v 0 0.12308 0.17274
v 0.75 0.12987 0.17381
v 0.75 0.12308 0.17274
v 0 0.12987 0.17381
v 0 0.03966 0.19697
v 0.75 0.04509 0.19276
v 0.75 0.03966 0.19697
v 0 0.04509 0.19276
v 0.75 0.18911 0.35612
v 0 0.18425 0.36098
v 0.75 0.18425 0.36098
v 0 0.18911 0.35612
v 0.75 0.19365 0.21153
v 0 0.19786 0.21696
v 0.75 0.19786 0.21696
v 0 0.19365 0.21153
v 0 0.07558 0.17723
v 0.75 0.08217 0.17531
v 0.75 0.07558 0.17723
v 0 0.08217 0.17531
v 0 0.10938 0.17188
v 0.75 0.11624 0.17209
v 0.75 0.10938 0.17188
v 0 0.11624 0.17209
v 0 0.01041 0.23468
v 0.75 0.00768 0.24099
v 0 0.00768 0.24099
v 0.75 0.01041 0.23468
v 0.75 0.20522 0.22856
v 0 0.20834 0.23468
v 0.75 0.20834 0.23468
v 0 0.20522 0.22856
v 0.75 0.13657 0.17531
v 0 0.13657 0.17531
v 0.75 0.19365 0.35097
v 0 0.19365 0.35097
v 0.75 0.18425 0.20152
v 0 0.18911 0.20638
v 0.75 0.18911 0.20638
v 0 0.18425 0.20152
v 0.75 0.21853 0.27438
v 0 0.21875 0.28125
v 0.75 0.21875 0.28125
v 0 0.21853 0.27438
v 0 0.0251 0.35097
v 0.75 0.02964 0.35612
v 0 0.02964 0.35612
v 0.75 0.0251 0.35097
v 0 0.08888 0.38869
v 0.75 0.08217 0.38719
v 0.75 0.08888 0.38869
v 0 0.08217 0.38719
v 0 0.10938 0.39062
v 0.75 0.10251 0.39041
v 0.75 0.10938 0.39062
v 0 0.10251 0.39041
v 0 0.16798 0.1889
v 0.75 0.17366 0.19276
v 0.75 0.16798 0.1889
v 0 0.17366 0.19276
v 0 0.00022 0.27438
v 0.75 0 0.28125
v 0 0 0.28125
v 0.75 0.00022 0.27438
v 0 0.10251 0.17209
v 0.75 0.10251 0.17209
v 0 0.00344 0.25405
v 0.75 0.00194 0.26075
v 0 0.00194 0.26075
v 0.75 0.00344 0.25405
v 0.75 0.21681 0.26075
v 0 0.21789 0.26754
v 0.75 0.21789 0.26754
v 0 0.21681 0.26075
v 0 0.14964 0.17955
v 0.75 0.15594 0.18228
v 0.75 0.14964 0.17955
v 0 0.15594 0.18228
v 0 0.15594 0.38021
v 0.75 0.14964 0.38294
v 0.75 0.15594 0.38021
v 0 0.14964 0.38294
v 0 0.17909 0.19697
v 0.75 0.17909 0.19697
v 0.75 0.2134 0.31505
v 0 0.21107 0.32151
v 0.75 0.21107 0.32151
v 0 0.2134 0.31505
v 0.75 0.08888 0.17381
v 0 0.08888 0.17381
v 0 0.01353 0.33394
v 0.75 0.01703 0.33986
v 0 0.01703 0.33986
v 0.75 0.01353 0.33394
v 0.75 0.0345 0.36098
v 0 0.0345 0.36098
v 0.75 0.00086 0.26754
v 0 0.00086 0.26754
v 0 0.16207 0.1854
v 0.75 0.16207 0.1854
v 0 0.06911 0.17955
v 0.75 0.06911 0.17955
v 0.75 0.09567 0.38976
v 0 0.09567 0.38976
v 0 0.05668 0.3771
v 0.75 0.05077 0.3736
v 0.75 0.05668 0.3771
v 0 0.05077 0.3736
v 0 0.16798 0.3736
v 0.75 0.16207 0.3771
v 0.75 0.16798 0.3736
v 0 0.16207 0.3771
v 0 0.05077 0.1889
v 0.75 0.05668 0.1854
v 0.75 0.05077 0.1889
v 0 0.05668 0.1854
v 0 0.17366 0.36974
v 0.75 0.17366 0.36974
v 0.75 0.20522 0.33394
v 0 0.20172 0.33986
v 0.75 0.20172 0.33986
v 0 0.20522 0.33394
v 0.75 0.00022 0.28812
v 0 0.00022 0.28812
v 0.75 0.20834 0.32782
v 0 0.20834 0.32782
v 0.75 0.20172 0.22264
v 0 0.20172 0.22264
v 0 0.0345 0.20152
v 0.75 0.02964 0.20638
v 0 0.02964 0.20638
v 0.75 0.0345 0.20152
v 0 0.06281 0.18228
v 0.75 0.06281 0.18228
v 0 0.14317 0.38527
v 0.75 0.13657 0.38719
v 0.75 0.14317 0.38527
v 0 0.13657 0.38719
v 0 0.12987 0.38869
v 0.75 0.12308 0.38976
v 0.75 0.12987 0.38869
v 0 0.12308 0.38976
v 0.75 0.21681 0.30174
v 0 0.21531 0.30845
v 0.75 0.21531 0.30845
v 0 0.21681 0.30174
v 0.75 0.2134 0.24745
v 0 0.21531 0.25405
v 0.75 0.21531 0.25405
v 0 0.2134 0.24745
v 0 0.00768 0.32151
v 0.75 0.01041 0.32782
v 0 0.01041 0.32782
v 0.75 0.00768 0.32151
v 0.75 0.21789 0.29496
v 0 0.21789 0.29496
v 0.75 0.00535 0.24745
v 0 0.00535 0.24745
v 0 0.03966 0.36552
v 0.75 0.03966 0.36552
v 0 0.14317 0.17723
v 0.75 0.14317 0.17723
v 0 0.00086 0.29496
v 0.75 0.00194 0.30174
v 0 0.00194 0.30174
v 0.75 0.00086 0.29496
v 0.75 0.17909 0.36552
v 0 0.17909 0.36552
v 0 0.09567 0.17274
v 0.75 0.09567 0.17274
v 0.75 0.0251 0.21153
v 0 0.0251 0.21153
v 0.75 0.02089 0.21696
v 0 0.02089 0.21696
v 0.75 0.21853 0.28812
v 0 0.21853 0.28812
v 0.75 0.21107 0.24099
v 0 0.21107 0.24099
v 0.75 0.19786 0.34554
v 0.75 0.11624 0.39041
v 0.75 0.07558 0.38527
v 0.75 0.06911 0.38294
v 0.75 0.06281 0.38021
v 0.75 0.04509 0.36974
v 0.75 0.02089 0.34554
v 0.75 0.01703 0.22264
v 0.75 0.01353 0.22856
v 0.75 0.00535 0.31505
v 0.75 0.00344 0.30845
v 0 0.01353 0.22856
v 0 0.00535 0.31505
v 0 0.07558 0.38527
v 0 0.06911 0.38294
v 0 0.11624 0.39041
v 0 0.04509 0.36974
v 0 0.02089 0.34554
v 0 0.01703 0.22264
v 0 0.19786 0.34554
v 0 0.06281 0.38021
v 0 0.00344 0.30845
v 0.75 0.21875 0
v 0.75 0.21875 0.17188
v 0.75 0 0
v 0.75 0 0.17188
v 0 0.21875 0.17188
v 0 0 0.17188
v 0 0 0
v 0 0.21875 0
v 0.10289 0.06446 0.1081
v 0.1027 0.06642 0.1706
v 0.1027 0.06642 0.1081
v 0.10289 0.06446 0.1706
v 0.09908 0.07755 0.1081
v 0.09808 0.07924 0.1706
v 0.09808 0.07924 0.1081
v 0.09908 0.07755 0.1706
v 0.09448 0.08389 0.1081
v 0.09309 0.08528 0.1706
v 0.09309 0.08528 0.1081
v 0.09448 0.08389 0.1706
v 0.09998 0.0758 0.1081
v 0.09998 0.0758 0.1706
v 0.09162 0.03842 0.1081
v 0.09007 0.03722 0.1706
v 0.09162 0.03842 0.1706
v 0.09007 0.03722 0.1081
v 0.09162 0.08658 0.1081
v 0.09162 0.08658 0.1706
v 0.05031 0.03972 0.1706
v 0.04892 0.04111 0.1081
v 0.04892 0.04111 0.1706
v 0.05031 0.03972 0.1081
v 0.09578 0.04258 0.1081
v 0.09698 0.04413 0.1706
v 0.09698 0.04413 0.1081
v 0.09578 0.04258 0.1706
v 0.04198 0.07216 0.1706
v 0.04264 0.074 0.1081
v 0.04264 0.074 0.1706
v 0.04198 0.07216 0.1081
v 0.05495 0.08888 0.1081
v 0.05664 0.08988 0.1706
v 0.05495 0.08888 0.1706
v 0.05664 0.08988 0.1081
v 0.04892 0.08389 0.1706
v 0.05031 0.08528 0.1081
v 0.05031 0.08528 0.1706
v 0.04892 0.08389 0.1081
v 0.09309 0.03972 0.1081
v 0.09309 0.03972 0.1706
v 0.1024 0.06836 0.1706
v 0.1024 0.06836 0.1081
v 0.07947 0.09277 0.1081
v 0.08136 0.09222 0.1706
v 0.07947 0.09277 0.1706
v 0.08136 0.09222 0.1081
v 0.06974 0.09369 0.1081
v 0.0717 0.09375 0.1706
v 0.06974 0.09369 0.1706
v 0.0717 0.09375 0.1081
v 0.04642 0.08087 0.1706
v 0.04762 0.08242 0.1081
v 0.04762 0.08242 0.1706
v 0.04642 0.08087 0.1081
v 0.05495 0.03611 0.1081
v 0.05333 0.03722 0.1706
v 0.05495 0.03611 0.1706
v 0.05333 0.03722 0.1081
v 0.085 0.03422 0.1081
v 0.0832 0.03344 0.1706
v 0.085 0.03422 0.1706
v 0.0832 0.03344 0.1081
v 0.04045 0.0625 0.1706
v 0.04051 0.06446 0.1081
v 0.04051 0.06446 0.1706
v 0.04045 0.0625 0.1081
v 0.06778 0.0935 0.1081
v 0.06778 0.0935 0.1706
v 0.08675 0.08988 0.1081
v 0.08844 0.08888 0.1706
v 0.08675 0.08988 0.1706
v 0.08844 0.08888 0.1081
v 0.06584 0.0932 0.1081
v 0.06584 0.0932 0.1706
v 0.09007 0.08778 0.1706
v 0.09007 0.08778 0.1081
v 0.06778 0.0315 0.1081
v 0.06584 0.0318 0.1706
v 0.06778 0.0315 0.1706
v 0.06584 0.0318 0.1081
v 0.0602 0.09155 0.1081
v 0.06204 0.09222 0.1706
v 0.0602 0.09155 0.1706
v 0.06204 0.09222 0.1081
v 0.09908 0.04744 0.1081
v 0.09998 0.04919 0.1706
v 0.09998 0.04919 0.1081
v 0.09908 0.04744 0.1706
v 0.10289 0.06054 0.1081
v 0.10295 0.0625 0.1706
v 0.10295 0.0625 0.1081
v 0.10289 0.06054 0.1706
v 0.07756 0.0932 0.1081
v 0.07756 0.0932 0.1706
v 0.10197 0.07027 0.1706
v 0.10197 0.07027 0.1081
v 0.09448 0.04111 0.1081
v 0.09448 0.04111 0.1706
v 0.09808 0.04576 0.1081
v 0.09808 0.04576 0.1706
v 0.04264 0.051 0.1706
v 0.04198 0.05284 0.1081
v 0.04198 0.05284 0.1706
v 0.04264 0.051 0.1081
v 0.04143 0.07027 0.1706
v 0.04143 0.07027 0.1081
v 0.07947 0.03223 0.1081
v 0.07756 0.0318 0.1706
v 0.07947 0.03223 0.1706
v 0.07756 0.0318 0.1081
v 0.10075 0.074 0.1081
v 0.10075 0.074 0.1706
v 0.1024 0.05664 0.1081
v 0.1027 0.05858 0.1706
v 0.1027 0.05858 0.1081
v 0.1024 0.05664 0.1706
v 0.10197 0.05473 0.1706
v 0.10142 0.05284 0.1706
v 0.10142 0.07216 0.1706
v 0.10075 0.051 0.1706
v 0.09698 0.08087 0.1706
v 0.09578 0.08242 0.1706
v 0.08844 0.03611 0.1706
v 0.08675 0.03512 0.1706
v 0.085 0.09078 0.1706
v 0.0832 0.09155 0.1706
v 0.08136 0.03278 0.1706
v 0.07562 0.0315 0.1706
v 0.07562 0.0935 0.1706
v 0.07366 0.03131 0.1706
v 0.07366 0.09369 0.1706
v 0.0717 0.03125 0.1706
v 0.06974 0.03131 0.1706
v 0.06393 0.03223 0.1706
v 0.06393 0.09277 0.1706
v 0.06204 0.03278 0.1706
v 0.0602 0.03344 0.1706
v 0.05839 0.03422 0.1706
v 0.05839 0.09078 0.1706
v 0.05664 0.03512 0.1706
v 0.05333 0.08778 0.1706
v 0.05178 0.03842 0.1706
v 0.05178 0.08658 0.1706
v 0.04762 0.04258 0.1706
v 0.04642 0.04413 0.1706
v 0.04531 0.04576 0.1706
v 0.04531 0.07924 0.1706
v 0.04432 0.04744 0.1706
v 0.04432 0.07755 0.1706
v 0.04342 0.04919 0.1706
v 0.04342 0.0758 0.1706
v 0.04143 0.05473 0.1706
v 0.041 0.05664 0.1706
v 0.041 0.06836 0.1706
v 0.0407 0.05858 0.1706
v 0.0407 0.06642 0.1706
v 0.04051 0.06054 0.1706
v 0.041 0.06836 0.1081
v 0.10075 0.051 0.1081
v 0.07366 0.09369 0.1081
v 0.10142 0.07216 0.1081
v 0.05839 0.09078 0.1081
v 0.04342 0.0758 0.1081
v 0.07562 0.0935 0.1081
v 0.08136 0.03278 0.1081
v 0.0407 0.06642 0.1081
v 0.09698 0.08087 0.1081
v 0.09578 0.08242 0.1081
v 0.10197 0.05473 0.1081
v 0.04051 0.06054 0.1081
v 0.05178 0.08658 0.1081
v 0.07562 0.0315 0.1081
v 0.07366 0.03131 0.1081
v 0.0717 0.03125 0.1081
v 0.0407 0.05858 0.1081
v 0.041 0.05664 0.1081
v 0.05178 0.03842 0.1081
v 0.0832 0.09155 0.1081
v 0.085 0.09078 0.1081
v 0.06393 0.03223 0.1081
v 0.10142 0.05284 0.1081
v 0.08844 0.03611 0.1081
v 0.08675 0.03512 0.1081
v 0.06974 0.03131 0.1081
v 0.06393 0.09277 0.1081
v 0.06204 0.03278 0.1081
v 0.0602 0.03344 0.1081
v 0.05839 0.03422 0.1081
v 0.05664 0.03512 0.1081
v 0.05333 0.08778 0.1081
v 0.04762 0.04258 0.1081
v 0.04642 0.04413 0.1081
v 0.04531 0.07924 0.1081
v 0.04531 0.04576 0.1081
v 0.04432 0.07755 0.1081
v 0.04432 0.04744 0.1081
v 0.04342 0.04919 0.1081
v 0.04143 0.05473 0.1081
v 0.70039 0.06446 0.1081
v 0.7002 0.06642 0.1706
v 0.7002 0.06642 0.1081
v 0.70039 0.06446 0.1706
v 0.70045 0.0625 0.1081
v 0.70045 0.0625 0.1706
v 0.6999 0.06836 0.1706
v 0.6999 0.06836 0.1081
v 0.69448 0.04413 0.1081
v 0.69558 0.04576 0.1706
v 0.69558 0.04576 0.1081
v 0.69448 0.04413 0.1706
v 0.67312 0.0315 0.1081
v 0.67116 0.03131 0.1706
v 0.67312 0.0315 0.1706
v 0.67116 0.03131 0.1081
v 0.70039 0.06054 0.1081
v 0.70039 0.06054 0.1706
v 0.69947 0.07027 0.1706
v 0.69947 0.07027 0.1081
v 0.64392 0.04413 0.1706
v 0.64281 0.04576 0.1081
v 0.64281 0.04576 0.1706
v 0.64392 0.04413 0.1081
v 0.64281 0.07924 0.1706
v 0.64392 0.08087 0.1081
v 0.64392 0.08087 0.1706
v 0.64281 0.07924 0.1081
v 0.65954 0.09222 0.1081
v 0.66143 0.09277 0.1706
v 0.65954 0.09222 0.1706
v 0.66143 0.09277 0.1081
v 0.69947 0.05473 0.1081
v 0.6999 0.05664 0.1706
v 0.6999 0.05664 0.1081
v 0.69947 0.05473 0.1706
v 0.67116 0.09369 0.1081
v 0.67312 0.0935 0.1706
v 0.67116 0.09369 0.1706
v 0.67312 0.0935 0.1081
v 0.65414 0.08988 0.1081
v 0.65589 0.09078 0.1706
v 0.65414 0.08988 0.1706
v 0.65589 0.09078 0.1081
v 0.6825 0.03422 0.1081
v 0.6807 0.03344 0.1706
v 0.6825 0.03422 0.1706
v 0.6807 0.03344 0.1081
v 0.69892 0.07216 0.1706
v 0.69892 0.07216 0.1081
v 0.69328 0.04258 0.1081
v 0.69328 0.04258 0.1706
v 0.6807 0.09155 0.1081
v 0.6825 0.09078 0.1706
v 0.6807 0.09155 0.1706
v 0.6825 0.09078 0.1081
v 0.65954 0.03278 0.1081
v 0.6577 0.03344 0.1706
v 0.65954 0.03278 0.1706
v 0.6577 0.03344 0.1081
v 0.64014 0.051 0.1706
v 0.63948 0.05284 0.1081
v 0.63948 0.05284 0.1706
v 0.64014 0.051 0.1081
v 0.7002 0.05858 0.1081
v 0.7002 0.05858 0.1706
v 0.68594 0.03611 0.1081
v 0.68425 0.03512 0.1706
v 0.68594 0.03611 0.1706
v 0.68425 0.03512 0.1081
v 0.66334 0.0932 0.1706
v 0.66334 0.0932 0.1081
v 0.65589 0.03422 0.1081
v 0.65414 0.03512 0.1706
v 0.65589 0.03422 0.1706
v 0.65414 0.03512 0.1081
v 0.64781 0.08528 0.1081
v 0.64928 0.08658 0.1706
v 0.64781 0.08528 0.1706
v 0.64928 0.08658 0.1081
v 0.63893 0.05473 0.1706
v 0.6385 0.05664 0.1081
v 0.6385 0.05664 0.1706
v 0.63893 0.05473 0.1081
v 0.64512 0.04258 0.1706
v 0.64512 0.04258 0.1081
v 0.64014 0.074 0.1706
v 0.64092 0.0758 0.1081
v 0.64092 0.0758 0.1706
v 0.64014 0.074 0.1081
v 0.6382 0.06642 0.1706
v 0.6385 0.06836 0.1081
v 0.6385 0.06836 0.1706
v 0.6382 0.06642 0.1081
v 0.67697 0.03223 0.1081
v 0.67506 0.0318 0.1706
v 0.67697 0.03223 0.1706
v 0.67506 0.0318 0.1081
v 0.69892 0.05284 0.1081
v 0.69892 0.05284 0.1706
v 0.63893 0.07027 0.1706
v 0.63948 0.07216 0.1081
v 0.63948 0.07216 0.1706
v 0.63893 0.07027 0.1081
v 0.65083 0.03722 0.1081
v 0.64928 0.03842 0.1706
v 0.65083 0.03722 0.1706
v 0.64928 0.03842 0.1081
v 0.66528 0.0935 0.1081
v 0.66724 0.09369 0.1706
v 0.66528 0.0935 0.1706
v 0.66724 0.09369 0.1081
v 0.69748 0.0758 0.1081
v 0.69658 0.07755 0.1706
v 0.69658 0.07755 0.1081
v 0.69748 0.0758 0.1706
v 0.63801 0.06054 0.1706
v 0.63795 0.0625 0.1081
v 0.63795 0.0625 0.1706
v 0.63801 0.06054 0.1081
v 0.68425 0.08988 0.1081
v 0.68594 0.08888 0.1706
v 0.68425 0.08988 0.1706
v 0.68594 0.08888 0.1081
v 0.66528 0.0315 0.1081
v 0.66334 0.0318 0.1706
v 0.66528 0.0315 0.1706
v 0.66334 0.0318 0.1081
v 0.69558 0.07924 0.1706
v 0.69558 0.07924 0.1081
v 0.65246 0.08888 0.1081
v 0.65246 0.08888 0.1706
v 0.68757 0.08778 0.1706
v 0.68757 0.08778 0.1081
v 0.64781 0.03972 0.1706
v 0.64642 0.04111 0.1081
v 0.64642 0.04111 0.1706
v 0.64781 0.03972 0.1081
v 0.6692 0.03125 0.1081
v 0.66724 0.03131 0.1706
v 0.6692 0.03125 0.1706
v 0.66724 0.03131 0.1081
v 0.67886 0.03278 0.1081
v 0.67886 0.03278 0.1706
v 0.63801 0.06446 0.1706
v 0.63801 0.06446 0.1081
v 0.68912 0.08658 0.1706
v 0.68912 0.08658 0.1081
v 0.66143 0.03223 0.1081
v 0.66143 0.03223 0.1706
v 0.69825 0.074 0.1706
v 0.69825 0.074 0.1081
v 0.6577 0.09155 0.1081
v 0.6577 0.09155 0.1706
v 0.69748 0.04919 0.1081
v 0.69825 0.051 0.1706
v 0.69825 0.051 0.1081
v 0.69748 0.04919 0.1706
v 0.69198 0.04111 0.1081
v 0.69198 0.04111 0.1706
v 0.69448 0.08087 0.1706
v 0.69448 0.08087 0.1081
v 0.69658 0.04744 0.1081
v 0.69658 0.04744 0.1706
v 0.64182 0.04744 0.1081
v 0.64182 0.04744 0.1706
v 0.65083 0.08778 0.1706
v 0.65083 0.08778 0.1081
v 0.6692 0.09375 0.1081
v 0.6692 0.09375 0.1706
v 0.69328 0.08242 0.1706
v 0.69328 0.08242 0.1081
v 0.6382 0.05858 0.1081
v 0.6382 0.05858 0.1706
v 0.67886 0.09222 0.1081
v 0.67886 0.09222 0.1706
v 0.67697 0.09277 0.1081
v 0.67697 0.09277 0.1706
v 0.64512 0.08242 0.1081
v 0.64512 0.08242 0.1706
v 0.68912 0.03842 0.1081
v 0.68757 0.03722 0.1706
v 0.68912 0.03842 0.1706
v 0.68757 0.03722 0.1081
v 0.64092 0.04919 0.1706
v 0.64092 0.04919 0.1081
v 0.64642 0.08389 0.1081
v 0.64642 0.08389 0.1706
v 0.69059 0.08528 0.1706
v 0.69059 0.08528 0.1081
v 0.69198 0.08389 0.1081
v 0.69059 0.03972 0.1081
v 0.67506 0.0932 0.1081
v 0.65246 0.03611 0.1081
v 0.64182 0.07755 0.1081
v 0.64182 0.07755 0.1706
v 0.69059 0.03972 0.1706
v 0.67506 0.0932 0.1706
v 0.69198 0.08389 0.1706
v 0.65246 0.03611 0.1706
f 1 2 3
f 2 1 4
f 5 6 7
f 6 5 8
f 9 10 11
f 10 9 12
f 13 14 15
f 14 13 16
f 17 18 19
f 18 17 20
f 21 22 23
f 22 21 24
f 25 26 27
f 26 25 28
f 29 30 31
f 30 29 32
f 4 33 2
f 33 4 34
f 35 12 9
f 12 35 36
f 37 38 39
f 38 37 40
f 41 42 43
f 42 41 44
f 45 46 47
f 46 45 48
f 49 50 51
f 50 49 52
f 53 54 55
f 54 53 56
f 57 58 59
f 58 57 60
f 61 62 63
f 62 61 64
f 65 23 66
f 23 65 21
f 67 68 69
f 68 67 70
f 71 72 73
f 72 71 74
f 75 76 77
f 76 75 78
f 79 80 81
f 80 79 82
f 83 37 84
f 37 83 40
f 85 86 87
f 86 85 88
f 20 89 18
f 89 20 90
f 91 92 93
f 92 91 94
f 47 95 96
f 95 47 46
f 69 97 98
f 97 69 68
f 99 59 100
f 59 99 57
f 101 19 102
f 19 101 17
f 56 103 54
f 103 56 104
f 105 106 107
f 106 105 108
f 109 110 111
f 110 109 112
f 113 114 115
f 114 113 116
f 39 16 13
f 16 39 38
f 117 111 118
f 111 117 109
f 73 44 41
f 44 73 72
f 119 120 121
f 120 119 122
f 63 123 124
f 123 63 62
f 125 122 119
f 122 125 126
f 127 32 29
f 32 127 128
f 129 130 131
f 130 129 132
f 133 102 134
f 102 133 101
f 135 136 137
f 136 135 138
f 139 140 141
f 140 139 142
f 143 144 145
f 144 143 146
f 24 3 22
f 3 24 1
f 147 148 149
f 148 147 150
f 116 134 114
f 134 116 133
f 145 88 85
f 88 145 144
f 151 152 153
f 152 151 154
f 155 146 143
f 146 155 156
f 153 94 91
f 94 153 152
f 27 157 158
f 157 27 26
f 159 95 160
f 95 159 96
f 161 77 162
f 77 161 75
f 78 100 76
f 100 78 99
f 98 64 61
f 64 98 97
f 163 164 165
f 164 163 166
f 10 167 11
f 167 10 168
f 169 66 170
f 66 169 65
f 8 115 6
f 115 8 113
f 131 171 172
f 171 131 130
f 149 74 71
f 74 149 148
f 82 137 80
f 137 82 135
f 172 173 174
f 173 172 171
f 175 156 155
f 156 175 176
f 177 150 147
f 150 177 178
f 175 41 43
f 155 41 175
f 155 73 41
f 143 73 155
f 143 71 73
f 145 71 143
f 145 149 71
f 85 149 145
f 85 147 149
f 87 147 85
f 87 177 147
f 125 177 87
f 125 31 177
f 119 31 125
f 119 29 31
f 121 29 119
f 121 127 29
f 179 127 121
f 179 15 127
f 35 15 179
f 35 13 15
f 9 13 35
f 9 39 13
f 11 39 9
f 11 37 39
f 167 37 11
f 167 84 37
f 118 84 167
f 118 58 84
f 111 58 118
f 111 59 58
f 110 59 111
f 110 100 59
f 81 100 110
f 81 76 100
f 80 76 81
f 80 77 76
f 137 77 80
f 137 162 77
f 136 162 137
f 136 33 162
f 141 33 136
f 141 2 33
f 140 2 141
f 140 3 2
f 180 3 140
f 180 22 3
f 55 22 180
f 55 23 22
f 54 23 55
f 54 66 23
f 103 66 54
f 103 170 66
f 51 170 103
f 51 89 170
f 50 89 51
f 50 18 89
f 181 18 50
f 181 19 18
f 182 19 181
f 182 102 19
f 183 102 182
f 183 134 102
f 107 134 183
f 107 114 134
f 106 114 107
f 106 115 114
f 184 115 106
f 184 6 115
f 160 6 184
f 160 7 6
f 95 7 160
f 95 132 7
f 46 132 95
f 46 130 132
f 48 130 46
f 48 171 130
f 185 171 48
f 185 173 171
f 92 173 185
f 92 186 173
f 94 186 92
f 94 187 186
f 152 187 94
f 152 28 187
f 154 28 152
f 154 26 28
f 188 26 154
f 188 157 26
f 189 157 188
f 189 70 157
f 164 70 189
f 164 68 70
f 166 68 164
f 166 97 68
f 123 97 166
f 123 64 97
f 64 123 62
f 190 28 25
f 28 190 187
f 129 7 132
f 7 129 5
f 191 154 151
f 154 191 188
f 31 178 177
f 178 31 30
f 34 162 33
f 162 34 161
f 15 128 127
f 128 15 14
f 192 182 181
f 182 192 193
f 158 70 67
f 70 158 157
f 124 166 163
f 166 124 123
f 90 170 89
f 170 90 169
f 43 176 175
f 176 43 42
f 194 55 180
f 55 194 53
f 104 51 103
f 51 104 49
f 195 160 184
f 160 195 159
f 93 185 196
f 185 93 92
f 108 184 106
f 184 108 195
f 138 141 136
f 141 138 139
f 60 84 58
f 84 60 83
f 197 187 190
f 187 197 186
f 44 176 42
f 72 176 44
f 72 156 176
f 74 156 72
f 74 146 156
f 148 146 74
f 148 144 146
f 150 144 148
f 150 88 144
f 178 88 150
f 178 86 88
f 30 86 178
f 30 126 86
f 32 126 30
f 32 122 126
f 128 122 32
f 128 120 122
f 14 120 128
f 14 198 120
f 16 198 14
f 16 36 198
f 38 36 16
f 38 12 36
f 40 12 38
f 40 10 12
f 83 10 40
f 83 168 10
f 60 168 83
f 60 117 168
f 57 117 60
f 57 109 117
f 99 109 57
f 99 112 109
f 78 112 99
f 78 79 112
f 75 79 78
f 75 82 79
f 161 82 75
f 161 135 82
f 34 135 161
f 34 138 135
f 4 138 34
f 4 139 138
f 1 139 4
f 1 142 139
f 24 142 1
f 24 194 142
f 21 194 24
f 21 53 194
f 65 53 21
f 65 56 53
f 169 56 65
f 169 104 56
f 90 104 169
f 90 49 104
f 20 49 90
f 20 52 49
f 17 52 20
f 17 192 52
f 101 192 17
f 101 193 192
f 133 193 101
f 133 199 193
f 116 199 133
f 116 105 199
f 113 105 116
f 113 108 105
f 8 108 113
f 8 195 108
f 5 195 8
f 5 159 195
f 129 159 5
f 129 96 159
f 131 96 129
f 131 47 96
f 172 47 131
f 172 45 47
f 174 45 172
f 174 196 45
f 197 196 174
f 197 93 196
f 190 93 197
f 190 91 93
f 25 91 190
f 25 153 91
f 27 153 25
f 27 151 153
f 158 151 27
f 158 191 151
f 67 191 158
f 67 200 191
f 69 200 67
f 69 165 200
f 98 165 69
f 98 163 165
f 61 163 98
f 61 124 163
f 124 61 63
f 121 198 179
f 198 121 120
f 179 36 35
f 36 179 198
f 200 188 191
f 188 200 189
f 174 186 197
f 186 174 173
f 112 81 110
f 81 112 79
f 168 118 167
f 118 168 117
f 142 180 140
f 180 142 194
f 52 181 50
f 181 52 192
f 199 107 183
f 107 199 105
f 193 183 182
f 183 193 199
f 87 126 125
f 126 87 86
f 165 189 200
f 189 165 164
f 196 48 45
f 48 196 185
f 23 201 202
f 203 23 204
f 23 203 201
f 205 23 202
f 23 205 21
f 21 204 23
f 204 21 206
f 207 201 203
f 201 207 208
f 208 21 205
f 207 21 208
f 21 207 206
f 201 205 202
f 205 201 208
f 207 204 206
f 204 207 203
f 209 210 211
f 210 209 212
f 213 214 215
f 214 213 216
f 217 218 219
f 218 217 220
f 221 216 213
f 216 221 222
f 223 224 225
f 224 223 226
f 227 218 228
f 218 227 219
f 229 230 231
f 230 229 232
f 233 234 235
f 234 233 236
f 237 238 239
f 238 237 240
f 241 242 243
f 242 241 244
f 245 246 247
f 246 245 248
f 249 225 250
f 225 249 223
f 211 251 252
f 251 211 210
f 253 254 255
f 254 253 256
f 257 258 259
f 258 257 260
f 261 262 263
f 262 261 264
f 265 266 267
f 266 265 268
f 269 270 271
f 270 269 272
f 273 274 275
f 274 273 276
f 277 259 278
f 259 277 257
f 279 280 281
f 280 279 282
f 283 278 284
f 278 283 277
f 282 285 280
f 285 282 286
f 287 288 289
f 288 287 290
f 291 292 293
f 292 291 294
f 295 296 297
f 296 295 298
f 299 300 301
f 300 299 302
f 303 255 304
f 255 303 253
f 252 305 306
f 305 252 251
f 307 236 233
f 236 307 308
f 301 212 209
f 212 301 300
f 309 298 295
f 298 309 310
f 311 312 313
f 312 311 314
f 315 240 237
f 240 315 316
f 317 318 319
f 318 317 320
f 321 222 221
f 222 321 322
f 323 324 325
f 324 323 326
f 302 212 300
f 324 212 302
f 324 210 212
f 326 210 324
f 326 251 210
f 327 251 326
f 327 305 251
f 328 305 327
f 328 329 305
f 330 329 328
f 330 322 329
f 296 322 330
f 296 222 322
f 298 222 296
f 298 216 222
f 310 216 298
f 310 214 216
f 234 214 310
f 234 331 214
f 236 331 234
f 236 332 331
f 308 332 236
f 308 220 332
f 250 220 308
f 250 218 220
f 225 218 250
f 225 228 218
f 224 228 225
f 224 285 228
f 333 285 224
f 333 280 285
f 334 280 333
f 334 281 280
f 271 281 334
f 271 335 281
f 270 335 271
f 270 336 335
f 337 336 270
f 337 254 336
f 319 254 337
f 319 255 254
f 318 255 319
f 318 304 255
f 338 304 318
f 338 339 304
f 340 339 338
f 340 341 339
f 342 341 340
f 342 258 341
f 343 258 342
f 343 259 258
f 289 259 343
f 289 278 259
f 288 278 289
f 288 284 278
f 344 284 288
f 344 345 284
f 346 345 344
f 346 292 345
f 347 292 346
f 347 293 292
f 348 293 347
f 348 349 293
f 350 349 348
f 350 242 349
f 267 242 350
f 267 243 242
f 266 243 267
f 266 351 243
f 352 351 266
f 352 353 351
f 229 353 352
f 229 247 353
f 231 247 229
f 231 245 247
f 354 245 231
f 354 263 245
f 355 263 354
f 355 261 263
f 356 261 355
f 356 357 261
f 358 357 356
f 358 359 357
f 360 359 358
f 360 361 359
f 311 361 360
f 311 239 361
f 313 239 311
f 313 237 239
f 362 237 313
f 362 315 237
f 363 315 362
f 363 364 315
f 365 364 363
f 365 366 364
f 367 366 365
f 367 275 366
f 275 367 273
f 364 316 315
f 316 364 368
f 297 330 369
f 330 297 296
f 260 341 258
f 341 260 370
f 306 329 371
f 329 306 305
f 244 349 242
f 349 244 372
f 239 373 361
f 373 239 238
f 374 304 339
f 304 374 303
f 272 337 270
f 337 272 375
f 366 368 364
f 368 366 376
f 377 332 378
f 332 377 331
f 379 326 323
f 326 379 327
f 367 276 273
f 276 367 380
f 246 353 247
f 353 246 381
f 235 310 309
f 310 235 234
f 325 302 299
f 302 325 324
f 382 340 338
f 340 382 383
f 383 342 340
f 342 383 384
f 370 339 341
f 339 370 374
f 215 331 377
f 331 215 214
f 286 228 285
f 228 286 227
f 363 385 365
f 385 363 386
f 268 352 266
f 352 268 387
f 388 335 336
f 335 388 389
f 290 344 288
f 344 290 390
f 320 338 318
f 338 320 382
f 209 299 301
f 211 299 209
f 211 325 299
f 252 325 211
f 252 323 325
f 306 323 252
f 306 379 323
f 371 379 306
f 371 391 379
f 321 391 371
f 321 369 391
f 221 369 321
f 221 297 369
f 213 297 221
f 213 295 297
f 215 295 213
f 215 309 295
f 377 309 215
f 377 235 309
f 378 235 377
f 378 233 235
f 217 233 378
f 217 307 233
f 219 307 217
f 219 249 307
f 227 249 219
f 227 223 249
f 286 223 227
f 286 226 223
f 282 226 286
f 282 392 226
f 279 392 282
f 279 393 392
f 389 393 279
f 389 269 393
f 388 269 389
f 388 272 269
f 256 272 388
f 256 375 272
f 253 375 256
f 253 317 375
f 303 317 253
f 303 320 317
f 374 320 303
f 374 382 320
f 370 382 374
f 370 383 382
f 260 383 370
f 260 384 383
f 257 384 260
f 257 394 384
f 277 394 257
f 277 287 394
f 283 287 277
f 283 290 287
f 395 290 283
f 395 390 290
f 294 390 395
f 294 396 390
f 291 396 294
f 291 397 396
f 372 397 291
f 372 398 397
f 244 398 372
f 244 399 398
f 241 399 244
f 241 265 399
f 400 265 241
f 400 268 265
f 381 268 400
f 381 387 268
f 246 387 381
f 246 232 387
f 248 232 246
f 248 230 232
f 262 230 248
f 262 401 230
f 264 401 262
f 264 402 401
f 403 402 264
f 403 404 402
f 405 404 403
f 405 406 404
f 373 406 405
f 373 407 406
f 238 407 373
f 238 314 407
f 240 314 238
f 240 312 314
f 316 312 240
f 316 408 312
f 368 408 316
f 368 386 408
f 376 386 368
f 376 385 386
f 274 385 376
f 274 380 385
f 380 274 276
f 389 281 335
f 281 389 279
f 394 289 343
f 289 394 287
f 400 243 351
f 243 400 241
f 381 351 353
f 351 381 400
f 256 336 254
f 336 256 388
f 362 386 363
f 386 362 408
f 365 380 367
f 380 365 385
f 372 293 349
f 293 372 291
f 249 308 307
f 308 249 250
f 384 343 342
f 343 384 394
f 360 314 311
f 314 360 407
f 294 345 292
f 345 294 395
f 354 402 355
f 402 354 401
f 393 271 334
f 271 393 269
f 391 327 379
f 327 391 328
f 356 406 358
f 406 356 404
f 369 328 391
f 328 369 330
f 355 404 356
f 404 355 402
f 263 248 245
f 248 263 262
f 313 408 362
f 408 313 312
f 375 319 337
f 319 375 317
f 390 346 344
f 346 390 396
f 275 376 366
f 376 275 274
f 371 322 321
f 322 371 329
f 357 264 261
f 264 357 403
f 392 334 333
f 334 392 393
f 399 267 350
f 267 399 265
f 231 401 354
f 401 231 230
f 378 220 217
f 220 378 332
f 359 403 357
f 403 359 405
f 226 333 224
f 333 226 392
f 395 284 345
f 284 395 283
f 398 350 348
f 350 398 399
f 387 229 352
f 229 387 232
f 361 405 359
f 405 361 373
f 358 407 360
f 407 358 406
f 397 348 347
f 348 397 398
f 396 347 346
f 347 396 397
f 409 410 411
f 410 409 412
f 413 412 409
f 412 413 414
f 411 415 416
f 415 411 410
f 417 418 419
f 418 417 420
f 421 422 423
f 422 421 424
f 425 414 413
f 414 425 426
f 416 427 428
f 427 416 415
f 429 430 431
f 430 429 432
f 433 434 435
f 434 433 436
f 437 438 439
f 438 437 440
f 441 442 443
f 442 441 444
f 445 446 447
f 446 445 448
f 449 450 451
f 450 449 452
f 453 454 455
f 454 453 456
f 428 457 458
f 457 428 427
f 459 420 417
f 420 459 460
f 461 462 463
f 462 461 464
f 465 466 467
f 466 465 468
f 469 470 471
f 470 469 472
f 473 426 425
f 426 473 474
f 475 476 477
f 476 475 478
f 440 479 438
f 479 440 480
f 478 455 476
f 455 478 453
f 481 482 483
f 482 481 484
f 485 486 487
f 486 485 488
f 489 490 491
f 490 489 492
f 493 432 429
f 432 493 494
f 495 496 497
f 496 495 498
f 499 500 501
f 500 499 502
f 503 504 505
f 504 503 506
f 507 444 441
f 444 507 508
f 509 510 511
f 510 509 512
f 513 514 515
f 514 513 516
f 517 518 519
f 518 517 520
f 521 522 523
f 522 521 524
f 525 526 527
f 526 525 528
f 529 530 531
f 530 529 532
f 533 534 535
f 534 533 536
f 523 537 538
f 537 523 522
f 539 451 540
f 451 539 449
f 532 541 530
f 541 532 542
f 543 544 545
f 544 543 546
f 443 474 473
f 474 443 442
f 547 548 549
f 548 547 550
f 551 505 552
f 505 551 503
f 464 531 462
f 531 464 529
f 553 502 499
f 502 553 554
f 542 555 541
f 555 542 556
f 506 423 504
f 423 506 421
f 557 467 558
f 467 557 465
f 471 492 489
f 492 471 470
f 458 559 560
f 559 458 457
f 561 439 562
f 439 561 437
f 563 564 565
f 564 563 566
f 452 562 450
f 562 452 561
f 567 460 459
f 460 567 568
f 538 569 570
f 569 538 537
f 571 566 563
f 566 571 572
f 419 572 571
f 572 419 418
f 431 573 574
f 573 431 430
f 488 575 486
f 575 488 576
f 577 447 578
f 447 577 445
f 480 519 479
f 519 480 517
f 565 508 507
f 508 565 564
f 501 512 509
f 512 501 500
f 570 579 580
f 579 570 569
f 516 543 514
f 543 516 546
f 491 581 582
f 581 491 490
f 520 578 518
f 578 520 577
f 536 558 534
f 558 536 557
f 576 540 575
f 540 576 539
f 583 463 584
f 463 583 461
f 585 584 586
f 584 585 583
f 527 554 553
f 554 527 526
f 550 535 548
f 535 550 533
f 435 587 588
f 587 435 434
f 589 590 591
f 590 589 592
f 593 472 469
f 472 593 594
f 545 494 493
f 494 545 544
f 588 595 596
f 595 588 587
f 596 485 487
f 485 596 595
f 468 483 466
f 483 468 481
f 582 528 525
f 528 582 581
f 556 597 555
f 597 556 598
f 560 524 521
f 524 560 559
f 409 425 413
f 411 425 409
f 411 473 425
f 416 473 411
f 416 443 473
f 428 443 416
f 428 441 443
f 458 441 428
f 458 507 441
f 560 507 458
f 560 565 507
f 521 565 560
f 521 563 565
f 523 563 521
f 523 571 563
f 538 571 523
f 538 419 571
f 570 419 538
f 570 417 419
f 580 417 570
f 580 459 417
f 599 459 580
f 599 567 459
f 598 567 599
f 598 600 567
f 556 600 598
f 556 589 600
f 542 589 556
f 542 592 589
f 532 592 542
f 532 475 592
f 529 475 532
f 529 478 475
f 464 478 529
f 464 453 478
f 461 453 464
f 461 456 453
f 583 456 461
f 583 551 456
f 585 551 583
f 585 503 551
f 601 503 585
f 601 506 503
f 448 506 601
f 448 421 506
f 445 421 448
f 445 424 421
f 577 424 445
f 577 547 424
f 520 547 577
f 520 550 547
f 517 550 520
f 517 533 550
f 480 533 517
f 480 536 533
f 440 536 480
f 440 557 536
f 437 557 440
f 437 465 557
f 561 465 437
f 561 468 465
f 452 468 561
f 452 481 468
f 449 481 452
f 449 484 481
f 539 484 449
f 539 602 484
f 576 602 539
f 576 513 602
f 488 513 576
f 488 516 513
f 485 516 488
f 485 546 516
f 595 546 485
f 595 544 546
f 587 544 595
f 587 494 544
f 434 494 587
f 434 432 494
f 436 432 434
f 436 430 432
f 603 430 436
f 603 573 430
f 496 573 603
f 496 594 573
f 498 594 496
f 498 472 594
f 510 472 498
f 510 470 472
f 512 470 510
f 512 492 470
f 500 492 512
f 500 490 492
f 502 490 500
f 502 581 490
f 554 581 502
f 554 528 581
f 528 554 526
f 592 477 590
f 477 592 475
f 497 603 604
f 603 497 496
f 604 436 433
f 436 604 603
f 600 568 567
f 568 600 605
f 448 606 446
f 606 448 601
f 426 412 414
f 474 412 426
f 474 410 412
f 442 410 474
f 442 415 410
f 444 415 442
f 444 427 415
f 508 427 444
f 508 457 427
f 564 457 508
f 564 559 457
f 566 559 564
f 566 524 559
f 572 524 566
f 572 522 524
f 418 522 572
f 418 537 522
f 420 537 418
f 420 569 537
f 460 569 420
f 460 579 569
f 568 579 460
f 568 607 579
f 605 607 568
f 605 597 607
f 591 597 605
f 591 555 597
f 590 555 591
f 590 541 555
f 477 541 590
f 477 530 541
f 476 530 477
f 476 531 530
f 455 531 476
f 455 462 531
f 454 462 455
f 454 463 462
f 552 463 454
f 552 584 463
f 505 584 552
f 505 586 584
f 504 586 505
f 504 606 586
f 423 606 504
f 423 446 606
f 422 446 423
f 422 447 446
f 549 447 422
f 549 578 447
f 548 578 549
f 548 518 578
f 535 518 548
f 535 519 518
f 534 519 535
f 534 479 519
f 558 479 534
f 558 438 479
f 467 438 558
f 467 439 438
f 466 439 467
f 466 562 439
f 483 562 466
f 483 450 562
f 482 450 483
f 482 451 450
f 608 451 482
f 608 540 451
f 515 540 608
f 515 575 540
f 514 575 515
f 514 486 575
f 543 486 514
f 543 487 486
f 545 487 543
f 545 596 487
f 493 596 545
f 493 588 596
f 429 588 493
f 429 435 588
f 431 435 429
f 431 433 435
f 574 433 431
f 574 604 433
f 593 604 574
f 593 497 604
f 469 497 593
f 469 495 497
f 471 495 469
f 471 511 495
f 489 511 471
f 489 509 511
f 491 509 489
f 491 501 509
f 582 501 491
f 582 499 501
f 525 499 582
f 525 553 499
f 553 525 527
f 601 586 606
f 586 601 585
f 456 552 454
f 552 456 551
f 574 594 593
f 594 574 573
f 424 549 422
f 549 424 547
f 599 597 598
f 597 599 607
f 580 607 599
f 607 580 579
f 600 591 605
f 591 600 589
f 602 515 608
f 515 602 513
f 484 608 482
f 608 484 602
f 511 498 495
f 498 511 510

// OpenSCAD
// Parameters – all dimensions in inches
length         = 0.75;
width          = 0.21875;
total_height   = 0.28125;
arch_radius    = width / 2;                // 0.109375
wall_height    = total_height - arch_radius; // 0.171875

// Hole parameters
hole1_x        = 0.0717;
hole2_x        = 0.6692;
hole_y         = 0.0625;
hole_bottom_z  = 0.1081;
hole_height    = 0.0625;   // 0.1705 – 0.1081
hole_radius    = 0.03125;  // diameter = 0.0625

$fn = 100;  // smooth curves

// -------------------------------------------------------------------
// Base geometry: rectangular lower block + arched top
module base() {
    union() {
        // Lower rectangular block (full footprint)
        cube([length, width, wall_height]);
        
        // Arched top – half‑cylinder placed along the X‑axis
        difference() {
            // Full horizontal cylinder
            translate([0, width/2, total_height])
                rotate([0, 90, 0])
                    cylinder(h = length, r = arch_radius, center = false);
            // Remove the portion below the wall top (Z = 0 … wall_height)
            translate([-0.1, -0.1, -0.1])
                cube([length + 0.2, width + 0.2, wall_height + 0.1]);
        }
    }
}

// -------------------------------------------------------------------
// Main model – subtract two vertical blind holes
difference() {
    base();
    // Hole 1
    translate([hole1_x, hole_y, hole_bottom_z])
        cylinder(h = hole_height, r = hole_radius);
    // Hole 2
    translate([hole2_x, hole_y, hole_bottom_z])
        cylinder(h = hole_height, r = hole_radius);
}
